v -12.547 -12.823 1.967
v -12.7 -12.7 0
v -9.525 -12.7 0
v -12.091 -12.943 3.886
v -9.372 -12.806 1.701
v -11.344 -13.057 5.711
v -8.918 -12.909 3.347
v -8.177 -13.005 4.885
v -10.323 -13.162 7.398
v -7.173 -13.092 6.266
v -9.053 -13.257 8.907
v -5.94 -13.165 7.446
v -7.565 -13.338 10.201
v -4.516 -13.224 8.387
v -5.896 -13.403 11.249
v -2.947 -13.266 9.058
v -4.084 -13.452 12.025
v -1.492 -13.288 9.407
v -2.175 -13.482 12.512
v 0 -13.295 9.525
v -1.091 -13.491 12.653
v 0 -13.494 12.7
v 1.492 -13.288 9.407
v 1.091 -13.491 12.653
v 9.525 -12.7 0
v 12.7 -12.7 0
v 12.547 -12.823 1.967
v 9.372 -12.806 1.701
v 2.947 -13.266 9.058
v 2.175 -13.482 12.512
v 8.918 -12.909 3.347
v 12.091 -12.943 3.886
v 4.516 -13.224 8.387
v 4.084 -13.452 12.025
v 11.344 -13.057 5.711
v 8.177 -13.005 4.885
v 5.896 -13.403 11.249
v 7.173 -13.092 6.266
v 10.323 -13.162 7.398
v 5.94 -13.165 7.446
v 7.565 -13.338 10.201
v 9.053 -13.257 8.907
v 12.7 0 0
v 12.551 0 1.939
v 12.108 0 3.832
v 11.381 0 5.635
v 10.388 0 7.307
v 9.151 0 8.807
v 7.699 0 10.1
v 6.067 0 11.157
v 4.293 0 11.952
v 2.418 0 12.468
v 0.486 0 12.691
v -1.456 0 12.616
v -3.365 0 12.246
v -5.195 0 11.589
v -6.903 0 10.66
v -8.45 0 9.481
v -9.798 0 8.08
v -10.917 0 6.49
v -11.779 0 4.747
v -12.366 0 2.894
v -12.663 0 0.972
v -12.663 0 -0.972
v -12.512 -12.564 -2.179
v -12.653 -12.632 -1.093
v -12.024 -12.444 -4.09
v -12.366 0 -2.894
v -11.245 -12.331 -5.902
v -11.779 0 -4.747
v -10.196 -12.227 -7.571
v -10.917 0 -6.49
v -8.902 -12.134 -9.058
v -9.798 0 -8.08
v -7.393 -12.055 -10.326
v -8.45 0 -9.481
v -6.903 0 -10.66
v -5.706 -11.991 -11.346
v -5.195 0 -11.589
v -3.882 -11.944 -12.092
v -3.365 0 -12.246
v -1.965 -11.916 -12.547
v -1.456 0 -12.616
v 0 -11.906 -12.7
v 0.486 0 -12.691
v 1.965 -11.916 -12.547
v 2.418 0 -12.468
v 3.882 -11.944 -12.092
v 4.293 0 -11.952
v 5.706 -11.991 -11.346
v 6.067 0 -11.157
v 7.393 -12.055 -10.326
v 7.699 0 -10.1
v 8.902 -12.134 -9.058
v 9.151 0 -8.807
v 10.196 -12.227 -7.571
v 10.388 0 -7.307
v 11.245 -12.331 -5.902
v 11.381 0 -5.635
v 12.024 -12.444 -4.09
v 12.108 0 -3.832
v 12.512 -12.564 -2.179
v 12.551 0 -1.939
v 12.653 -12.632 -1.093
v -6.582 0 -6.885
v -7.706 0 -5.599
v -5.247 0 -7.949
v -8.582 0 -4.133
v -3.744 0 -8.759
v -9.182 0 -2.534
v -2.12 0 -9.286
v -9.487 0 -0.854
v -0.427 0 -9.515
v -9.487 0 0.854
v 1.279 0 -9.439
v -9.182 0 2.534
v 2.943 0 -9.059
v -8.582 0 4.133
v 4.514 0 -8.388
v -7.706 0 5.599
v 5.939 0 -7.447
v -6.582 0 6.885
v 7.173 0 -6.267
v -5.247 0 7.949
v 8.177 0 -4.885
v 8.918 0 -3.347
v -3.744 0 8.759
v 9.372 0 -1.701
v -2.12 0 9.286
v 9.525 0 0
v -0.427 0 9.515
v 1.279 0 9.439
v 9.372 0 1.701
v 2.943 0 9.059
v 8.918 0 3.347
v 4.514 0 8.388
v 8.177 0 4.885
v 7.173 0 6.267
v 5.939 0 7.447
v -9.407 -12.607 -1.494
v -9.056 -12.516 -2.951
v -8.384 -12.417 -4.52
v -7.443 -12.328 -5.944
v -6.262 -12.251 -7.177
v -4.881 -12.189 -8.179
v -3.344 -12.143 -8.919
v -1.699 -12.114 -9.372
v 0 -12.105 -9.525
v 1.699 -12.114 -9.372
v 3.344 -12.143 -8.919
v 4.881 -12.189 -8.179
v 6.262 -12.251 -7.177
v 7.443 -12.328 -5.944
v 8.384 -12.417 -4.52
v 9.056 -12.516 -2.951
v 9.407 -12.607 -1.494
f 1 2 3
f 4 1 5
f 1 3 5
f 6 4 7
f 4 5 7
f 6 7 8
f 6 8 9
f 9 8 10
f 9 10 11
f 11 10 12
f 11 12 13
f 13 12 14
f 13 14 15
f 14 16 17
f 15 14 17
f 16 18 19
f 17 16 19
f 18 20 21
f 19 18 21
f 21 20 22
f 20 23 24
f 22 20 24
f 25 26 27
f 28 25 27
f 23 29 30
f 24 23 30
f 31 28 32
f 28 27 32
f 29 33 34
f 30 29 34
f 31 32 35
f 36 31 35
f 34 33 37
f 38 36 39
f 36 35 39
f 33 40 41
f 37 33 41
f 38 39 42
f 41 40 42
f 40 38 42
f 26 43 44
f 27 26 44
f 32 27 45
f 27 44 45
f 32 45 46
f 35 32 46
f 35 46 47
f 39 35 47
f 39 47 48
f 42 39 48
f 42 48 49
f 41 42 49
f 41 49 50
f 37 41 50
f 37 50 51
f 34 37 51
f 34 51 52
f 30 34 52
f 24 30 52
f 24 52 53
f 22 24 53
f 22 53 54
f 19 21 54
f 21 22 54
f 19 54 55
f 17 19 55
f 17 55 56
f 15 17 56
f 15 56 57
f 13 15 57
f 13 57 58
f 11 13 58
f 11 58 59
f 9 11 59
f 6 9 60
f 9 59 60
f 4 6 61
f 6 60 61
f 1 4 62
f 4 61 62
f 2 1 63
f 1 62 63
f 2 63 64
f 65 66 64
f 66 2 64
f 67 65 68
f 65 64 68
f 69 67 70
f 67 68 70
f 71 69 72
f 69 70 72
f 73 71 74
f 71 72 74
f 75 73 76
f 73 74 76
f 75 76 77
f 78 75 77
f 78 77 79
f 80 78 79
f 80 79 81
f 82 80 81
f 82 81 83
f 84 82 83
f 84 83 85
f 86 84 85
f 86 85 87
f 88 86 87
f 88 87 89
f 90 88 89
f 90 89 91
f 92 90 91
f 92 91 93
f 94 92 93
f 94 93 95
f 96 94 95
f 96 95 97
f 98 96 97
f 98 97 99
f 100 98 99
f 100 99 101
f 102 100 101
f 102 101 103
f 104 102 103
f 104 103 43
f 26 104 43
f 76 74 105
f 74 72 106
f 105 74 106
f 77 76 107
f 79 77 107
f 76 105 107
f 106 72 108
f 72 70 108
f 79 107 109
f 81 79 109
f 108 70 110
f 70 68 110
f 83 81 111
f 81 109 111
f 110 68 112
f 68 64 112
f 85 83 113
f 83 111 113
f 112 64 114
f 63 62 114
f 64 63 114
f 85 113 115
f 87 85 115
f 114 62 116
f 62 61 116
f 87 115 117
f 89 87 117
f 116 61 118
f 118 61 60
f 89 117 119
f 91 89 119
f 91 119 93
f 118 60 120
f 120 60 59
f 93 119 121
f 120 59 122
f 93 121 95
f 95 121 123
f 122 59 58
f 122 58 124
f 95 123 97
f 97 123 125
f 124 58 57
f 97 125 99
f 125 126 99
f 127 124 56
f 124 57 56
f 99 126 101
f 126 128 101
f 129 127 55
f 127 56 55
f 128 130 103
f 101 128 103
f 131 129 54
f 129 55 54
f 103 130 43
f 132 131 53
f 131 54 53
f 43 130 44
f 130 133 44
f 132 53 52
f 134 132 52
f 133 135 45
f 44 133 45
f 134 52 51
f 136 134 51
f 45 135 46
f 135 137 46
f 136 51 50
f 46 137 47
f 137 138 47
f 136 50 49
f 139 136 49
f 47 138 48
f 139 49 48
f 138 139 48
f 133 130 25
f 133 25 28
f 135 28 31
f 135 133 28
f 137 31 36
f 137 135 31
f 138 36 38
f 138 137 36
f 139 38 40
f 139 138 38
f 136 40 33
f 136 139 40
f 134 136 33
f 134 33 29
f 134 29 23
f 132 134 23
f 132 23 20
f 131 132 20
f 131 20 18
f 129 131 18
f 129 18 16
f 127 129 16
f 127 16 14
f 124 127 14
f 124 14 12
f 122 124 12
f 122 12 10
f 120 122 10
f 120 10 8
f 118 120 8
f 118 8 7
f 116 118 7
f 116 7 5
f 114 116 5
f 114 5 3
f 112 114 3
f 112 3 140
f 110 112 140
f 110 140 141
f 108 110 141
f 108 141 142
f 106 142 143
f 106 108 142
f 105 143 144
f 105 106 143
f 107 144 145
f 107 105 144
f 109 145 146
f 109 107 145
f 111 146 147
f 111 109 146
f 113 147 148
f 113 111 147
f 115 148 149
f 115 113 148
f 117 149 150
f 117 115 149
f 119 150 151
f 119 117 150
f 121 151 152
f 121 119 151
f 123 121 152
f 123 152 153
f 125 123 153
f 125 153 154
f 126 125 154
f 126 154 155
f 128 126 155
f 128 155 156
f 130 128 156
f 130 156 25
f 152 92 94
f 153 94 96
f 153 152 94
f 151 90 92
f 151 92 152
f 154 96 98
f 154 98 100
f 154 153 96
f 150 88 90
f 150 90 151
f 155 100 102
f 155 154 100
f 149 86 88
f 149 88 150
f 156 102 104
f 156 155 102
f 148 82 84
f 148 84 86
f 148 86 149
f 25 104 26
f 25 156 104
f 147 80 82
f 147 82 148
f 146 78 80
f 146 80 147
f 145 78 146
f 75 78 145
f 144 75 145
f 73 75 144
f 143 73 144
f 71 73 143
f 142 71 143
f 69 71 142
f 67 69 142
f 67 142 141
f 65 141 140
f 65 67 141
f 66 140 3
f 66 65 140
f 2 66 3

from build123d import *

# Parameters (mm, degrees)
F0_R     = 12.7
F0_R_2   = 9.525
F1_DEPTH = 50.8
F3_DEPTH = 25.4
F4_DEPTH = 25.4


# Not quite as in the source:
# - a feature names something its author has since deleted; it is built from what else it names


with BuildPart() as f1:
    # F0 (on Front) → F1 (new body)
    with BuildSketch(Plane.XZ):
        Circle(F0_R)
        Circle(F0_R_2, mode=Mode.SUBTRACT)
    extrude(amount=F1_DEPTH)

    # F2 (on Right) → F3 (cut)
    with BuildSketch(Plane.YZ):
        Polygon((-36.6640808118, -22.974707012), (-38.1, 0), (-41.275, 50.8), (-42.5002469476, 70.4039511617), (-59.3533739448, 70.4039511617), (-59.3533739448, -22.974707012), align=None)
        Polygon((-38.1, 0), (-12.7, 0), (-15.875, 50.8), (-41.275, 50.8), align=None)
        Polygon((-11.2640808118, -22.974707012), (-12.7, 0), (-38.1, 0), (-36.6640808118, -22.974707012), align=None)
    extrude(amount=-F3_DEPTH, mode=Mode.SUBTRACT)

    # F2 (on Right) → F4 (cut)
    with BuildSketch(Plane.YZ):
        Polygon((-36.6640808118, -22.974707012), (-38.1, 0), (-41.275, 50.8), (-42.5002469476, 70.4039511617), (-59.3533739448, 70.4039511617), (-59.3533739448, -22.974707012), align=None)
        Polygon((-38.1, 0), (-12.7, 0), (-15.875, 50.8), (-41.275, 50.8), align=None)
        Polygon((-11.2640808118, -22.974707012), (-12.7, 0), (-38.1, 0), (-36.6640808118, -22.974707012), align=None)
    extrude(amount=F4_DEPTH, mode=Mode.SUBTRACT)


solid = f1.part
